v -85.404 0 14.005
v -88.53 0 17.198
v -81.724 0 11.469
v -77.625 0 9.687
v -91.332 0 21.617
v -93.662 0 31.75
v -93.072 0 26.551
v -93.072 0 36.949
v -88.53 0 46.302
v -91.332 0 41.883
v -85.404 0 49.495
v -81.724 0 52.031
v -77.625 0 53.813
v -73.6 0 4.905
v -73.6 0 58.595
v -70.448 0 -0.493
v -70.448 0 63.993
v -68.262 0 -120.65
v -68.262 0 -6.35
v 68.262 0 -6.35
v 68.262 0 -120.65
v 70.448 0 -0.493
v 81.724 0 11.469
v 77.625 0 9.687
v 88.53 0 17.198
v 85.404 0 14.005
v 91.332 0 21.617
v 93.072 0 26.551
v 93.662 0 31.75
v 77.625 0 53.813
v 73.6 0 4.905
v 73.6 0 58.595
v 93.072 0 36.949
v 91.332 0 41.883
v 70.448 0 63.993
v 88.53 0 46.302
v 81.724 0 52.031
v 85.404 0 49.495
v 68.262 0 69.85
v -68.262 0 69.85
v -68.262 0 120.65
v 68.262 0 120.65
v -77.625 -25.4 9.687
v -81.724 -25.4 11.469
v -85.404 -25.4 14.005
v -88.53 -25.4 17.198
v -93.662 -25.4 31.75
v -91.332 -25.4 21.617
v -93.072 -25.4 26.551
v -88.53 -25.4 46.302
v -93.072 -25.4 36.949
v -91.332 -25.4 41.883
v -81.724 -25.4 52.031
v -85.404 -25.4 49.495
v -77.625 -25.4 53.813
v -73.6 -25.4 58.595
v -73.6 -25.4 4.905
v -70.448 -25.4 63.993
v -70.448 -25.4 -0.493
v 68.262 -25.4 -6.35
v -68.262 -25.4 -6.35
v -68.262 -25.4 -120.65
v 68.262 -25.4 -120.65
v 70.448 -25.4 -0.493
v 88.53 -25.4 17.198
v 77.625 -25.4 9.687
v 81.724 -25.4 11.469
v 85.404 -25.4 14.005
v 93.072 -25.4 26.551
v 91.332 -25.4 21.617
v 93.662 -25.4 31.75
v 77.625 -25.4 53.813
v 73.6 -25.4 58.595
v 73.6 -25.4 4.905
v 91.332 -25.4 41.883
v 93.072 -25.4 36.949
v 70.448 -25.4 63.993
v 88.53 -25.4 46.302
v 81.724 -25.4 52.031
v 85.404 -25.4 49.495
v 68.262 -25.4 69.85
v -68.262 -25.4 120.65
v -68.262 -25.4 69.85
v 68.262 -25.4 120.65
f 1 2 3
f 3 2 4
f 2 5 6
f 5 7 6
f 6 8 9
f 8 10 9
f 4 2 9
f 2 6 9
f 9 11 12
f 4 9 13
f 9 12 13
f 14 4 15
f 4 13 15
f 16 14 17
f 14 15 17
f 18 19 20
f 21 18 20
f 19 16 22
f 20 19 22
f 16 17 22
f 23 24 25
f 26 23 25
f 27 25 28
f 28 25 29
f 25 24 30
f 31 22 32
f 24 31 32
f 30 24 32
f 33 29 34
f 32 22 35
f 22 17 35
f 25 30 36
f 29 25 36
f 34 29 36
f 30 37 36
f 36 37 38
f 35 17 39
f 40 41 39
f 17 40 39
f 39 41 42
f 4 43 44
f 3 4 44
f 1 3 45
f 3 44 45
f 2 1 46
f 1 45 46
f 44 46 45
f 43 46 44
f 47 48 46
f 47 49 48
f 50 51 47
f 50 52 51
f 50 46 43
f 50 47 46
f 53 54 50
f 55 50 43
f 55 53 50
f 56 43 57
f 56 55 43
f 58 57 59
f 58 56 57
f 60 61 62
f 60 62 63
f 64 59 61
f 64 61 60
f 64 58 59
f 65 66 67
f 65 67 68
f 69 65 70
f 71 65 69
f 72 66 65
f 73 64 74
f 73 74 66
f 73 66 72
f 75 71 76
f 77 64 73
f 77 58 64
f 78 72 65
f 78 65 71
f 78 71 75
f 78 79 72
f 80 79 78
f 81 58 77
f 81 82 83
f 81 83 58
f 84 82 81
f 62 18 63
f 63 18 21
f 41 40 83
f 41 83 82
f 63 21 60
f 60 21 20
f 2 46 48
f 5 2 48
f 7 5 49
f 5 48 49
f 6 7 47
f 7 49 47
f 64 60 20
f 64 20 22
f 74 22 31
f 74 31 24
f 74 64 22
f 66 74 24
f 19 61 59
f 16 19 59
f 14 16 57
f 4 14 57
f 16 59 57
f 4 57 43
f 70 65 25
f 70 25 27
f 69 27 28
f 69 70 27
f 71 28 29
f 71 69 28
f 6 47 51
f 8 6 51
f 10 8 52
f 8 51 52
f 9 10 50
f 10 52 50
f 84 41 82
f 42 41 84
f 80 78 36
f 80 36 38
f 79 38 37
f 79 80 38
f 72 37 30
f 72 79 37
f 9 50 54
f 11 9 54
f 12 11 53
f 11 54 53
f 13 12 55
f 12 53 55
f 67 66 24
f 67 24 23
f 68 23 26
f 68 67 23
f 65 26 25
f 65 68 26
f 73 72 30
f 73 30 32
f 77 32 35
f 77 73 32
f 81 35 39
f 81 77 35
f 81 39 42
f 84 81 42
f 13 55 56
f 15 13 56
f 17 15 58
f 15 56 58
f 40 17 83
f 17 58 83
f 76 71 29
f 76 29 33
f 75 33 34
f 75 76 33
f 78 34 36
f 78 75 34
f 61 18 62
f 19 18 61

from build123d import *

# Parameters (mm, degrees)
F0_W     = 136.525
F0_H     = 241.3
F1_DEPTH = 25.4
F3_DEPTH = 25.4


with BuildPart() as f1:
    # F0 (on Front) → F1 (new body)
    with BuildSketch(Plane.XZ):
        Rectangle(F0_W, F0_H)
    extrude(amount=F1_DEPTH)

    # F2 (on face) → F3 (join)
    with BuildSketch(Plane.XZ.offset(25.4)):
        with BuildLine():
            ThreePointArc((77.6254340957, 53.8129340957), (71.9080698474, 61.2266782869), (68.2625, 69.85))
            Line((68.2625, 69.85), (68.2625, -6.35))
            ThreePointArc((68.2625, -6.35), (71.9080698474, 2.2733217131), (77.6254340957, 9.6870659043))
            ThreePointArc((77.6254340957, 9.6870659043), (82.7346936877, 13.9409024845), (88.5302033496, 17.1984670639))
            ThreePointArc((88.5302033496, 17.1984670639), (92.3418278085, 24.0349565831), (93.6625, 31.75))
            ThreePointArc((93.6625, 31.75), (92.3418278085, 39.4650434169), (88.5302033496, 46.3015329361))
            ThreePointArc((88.5302033496, 46.3015329361), (82.7346936877, 49.5590975155), (77.6254340957, 53.8129340957))
        make_face()
        with BuildLine():
            ThreePointArc((88.5302033496, 46.3015329361), (83.6252121519, 50.8519186766), (77.6254340957, 53.8129340957))
            ThreePointArc((77.6254340957, 53.8129340957), (82.7346936877, 49.5590975155), (88.5302033496, 46.3015329361))
        make_face()
        with BuildLine():
            ThreePointArc((88.5302033496, 17.1984670639), (82.7346936877, 13.9409024845), (77.6254340957, 9.6870659043))
            ThreePointArc((77.6254340957, 9.6870659043), (83.6252121519, 12.6480813234), (88.5302033496, 17.1984670639))
        make_face()
    extrude(amount=-F3_DEPTH)

    # F4: F1 across plane


with BuildPart() as f1_1:
    add(f1.part)
    add(f1.part.mirror(Plane.YZ))


solid = f1_1.part
